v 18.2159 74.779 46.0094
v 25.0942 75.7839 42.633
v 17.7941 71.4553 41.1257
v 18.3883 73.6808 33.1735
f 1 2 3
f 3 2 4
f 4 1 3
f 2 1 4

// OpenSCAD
// Auto-generated auxetic polyhedron
points = [
    [17.794124, 71.455293, 41.125710],
    [25.094206, 75.783898, 42.632982],
    [18.215867, 74.779024, 46.009368],
    [18.388277, 73.680767, 33.173537],
];

faces = [
    [0, 1, 2],
    [3, 1, 0],
    [0, 2, 3],
    [3, 2, 1],
];

polyhedron(points = points, faces = faces);
